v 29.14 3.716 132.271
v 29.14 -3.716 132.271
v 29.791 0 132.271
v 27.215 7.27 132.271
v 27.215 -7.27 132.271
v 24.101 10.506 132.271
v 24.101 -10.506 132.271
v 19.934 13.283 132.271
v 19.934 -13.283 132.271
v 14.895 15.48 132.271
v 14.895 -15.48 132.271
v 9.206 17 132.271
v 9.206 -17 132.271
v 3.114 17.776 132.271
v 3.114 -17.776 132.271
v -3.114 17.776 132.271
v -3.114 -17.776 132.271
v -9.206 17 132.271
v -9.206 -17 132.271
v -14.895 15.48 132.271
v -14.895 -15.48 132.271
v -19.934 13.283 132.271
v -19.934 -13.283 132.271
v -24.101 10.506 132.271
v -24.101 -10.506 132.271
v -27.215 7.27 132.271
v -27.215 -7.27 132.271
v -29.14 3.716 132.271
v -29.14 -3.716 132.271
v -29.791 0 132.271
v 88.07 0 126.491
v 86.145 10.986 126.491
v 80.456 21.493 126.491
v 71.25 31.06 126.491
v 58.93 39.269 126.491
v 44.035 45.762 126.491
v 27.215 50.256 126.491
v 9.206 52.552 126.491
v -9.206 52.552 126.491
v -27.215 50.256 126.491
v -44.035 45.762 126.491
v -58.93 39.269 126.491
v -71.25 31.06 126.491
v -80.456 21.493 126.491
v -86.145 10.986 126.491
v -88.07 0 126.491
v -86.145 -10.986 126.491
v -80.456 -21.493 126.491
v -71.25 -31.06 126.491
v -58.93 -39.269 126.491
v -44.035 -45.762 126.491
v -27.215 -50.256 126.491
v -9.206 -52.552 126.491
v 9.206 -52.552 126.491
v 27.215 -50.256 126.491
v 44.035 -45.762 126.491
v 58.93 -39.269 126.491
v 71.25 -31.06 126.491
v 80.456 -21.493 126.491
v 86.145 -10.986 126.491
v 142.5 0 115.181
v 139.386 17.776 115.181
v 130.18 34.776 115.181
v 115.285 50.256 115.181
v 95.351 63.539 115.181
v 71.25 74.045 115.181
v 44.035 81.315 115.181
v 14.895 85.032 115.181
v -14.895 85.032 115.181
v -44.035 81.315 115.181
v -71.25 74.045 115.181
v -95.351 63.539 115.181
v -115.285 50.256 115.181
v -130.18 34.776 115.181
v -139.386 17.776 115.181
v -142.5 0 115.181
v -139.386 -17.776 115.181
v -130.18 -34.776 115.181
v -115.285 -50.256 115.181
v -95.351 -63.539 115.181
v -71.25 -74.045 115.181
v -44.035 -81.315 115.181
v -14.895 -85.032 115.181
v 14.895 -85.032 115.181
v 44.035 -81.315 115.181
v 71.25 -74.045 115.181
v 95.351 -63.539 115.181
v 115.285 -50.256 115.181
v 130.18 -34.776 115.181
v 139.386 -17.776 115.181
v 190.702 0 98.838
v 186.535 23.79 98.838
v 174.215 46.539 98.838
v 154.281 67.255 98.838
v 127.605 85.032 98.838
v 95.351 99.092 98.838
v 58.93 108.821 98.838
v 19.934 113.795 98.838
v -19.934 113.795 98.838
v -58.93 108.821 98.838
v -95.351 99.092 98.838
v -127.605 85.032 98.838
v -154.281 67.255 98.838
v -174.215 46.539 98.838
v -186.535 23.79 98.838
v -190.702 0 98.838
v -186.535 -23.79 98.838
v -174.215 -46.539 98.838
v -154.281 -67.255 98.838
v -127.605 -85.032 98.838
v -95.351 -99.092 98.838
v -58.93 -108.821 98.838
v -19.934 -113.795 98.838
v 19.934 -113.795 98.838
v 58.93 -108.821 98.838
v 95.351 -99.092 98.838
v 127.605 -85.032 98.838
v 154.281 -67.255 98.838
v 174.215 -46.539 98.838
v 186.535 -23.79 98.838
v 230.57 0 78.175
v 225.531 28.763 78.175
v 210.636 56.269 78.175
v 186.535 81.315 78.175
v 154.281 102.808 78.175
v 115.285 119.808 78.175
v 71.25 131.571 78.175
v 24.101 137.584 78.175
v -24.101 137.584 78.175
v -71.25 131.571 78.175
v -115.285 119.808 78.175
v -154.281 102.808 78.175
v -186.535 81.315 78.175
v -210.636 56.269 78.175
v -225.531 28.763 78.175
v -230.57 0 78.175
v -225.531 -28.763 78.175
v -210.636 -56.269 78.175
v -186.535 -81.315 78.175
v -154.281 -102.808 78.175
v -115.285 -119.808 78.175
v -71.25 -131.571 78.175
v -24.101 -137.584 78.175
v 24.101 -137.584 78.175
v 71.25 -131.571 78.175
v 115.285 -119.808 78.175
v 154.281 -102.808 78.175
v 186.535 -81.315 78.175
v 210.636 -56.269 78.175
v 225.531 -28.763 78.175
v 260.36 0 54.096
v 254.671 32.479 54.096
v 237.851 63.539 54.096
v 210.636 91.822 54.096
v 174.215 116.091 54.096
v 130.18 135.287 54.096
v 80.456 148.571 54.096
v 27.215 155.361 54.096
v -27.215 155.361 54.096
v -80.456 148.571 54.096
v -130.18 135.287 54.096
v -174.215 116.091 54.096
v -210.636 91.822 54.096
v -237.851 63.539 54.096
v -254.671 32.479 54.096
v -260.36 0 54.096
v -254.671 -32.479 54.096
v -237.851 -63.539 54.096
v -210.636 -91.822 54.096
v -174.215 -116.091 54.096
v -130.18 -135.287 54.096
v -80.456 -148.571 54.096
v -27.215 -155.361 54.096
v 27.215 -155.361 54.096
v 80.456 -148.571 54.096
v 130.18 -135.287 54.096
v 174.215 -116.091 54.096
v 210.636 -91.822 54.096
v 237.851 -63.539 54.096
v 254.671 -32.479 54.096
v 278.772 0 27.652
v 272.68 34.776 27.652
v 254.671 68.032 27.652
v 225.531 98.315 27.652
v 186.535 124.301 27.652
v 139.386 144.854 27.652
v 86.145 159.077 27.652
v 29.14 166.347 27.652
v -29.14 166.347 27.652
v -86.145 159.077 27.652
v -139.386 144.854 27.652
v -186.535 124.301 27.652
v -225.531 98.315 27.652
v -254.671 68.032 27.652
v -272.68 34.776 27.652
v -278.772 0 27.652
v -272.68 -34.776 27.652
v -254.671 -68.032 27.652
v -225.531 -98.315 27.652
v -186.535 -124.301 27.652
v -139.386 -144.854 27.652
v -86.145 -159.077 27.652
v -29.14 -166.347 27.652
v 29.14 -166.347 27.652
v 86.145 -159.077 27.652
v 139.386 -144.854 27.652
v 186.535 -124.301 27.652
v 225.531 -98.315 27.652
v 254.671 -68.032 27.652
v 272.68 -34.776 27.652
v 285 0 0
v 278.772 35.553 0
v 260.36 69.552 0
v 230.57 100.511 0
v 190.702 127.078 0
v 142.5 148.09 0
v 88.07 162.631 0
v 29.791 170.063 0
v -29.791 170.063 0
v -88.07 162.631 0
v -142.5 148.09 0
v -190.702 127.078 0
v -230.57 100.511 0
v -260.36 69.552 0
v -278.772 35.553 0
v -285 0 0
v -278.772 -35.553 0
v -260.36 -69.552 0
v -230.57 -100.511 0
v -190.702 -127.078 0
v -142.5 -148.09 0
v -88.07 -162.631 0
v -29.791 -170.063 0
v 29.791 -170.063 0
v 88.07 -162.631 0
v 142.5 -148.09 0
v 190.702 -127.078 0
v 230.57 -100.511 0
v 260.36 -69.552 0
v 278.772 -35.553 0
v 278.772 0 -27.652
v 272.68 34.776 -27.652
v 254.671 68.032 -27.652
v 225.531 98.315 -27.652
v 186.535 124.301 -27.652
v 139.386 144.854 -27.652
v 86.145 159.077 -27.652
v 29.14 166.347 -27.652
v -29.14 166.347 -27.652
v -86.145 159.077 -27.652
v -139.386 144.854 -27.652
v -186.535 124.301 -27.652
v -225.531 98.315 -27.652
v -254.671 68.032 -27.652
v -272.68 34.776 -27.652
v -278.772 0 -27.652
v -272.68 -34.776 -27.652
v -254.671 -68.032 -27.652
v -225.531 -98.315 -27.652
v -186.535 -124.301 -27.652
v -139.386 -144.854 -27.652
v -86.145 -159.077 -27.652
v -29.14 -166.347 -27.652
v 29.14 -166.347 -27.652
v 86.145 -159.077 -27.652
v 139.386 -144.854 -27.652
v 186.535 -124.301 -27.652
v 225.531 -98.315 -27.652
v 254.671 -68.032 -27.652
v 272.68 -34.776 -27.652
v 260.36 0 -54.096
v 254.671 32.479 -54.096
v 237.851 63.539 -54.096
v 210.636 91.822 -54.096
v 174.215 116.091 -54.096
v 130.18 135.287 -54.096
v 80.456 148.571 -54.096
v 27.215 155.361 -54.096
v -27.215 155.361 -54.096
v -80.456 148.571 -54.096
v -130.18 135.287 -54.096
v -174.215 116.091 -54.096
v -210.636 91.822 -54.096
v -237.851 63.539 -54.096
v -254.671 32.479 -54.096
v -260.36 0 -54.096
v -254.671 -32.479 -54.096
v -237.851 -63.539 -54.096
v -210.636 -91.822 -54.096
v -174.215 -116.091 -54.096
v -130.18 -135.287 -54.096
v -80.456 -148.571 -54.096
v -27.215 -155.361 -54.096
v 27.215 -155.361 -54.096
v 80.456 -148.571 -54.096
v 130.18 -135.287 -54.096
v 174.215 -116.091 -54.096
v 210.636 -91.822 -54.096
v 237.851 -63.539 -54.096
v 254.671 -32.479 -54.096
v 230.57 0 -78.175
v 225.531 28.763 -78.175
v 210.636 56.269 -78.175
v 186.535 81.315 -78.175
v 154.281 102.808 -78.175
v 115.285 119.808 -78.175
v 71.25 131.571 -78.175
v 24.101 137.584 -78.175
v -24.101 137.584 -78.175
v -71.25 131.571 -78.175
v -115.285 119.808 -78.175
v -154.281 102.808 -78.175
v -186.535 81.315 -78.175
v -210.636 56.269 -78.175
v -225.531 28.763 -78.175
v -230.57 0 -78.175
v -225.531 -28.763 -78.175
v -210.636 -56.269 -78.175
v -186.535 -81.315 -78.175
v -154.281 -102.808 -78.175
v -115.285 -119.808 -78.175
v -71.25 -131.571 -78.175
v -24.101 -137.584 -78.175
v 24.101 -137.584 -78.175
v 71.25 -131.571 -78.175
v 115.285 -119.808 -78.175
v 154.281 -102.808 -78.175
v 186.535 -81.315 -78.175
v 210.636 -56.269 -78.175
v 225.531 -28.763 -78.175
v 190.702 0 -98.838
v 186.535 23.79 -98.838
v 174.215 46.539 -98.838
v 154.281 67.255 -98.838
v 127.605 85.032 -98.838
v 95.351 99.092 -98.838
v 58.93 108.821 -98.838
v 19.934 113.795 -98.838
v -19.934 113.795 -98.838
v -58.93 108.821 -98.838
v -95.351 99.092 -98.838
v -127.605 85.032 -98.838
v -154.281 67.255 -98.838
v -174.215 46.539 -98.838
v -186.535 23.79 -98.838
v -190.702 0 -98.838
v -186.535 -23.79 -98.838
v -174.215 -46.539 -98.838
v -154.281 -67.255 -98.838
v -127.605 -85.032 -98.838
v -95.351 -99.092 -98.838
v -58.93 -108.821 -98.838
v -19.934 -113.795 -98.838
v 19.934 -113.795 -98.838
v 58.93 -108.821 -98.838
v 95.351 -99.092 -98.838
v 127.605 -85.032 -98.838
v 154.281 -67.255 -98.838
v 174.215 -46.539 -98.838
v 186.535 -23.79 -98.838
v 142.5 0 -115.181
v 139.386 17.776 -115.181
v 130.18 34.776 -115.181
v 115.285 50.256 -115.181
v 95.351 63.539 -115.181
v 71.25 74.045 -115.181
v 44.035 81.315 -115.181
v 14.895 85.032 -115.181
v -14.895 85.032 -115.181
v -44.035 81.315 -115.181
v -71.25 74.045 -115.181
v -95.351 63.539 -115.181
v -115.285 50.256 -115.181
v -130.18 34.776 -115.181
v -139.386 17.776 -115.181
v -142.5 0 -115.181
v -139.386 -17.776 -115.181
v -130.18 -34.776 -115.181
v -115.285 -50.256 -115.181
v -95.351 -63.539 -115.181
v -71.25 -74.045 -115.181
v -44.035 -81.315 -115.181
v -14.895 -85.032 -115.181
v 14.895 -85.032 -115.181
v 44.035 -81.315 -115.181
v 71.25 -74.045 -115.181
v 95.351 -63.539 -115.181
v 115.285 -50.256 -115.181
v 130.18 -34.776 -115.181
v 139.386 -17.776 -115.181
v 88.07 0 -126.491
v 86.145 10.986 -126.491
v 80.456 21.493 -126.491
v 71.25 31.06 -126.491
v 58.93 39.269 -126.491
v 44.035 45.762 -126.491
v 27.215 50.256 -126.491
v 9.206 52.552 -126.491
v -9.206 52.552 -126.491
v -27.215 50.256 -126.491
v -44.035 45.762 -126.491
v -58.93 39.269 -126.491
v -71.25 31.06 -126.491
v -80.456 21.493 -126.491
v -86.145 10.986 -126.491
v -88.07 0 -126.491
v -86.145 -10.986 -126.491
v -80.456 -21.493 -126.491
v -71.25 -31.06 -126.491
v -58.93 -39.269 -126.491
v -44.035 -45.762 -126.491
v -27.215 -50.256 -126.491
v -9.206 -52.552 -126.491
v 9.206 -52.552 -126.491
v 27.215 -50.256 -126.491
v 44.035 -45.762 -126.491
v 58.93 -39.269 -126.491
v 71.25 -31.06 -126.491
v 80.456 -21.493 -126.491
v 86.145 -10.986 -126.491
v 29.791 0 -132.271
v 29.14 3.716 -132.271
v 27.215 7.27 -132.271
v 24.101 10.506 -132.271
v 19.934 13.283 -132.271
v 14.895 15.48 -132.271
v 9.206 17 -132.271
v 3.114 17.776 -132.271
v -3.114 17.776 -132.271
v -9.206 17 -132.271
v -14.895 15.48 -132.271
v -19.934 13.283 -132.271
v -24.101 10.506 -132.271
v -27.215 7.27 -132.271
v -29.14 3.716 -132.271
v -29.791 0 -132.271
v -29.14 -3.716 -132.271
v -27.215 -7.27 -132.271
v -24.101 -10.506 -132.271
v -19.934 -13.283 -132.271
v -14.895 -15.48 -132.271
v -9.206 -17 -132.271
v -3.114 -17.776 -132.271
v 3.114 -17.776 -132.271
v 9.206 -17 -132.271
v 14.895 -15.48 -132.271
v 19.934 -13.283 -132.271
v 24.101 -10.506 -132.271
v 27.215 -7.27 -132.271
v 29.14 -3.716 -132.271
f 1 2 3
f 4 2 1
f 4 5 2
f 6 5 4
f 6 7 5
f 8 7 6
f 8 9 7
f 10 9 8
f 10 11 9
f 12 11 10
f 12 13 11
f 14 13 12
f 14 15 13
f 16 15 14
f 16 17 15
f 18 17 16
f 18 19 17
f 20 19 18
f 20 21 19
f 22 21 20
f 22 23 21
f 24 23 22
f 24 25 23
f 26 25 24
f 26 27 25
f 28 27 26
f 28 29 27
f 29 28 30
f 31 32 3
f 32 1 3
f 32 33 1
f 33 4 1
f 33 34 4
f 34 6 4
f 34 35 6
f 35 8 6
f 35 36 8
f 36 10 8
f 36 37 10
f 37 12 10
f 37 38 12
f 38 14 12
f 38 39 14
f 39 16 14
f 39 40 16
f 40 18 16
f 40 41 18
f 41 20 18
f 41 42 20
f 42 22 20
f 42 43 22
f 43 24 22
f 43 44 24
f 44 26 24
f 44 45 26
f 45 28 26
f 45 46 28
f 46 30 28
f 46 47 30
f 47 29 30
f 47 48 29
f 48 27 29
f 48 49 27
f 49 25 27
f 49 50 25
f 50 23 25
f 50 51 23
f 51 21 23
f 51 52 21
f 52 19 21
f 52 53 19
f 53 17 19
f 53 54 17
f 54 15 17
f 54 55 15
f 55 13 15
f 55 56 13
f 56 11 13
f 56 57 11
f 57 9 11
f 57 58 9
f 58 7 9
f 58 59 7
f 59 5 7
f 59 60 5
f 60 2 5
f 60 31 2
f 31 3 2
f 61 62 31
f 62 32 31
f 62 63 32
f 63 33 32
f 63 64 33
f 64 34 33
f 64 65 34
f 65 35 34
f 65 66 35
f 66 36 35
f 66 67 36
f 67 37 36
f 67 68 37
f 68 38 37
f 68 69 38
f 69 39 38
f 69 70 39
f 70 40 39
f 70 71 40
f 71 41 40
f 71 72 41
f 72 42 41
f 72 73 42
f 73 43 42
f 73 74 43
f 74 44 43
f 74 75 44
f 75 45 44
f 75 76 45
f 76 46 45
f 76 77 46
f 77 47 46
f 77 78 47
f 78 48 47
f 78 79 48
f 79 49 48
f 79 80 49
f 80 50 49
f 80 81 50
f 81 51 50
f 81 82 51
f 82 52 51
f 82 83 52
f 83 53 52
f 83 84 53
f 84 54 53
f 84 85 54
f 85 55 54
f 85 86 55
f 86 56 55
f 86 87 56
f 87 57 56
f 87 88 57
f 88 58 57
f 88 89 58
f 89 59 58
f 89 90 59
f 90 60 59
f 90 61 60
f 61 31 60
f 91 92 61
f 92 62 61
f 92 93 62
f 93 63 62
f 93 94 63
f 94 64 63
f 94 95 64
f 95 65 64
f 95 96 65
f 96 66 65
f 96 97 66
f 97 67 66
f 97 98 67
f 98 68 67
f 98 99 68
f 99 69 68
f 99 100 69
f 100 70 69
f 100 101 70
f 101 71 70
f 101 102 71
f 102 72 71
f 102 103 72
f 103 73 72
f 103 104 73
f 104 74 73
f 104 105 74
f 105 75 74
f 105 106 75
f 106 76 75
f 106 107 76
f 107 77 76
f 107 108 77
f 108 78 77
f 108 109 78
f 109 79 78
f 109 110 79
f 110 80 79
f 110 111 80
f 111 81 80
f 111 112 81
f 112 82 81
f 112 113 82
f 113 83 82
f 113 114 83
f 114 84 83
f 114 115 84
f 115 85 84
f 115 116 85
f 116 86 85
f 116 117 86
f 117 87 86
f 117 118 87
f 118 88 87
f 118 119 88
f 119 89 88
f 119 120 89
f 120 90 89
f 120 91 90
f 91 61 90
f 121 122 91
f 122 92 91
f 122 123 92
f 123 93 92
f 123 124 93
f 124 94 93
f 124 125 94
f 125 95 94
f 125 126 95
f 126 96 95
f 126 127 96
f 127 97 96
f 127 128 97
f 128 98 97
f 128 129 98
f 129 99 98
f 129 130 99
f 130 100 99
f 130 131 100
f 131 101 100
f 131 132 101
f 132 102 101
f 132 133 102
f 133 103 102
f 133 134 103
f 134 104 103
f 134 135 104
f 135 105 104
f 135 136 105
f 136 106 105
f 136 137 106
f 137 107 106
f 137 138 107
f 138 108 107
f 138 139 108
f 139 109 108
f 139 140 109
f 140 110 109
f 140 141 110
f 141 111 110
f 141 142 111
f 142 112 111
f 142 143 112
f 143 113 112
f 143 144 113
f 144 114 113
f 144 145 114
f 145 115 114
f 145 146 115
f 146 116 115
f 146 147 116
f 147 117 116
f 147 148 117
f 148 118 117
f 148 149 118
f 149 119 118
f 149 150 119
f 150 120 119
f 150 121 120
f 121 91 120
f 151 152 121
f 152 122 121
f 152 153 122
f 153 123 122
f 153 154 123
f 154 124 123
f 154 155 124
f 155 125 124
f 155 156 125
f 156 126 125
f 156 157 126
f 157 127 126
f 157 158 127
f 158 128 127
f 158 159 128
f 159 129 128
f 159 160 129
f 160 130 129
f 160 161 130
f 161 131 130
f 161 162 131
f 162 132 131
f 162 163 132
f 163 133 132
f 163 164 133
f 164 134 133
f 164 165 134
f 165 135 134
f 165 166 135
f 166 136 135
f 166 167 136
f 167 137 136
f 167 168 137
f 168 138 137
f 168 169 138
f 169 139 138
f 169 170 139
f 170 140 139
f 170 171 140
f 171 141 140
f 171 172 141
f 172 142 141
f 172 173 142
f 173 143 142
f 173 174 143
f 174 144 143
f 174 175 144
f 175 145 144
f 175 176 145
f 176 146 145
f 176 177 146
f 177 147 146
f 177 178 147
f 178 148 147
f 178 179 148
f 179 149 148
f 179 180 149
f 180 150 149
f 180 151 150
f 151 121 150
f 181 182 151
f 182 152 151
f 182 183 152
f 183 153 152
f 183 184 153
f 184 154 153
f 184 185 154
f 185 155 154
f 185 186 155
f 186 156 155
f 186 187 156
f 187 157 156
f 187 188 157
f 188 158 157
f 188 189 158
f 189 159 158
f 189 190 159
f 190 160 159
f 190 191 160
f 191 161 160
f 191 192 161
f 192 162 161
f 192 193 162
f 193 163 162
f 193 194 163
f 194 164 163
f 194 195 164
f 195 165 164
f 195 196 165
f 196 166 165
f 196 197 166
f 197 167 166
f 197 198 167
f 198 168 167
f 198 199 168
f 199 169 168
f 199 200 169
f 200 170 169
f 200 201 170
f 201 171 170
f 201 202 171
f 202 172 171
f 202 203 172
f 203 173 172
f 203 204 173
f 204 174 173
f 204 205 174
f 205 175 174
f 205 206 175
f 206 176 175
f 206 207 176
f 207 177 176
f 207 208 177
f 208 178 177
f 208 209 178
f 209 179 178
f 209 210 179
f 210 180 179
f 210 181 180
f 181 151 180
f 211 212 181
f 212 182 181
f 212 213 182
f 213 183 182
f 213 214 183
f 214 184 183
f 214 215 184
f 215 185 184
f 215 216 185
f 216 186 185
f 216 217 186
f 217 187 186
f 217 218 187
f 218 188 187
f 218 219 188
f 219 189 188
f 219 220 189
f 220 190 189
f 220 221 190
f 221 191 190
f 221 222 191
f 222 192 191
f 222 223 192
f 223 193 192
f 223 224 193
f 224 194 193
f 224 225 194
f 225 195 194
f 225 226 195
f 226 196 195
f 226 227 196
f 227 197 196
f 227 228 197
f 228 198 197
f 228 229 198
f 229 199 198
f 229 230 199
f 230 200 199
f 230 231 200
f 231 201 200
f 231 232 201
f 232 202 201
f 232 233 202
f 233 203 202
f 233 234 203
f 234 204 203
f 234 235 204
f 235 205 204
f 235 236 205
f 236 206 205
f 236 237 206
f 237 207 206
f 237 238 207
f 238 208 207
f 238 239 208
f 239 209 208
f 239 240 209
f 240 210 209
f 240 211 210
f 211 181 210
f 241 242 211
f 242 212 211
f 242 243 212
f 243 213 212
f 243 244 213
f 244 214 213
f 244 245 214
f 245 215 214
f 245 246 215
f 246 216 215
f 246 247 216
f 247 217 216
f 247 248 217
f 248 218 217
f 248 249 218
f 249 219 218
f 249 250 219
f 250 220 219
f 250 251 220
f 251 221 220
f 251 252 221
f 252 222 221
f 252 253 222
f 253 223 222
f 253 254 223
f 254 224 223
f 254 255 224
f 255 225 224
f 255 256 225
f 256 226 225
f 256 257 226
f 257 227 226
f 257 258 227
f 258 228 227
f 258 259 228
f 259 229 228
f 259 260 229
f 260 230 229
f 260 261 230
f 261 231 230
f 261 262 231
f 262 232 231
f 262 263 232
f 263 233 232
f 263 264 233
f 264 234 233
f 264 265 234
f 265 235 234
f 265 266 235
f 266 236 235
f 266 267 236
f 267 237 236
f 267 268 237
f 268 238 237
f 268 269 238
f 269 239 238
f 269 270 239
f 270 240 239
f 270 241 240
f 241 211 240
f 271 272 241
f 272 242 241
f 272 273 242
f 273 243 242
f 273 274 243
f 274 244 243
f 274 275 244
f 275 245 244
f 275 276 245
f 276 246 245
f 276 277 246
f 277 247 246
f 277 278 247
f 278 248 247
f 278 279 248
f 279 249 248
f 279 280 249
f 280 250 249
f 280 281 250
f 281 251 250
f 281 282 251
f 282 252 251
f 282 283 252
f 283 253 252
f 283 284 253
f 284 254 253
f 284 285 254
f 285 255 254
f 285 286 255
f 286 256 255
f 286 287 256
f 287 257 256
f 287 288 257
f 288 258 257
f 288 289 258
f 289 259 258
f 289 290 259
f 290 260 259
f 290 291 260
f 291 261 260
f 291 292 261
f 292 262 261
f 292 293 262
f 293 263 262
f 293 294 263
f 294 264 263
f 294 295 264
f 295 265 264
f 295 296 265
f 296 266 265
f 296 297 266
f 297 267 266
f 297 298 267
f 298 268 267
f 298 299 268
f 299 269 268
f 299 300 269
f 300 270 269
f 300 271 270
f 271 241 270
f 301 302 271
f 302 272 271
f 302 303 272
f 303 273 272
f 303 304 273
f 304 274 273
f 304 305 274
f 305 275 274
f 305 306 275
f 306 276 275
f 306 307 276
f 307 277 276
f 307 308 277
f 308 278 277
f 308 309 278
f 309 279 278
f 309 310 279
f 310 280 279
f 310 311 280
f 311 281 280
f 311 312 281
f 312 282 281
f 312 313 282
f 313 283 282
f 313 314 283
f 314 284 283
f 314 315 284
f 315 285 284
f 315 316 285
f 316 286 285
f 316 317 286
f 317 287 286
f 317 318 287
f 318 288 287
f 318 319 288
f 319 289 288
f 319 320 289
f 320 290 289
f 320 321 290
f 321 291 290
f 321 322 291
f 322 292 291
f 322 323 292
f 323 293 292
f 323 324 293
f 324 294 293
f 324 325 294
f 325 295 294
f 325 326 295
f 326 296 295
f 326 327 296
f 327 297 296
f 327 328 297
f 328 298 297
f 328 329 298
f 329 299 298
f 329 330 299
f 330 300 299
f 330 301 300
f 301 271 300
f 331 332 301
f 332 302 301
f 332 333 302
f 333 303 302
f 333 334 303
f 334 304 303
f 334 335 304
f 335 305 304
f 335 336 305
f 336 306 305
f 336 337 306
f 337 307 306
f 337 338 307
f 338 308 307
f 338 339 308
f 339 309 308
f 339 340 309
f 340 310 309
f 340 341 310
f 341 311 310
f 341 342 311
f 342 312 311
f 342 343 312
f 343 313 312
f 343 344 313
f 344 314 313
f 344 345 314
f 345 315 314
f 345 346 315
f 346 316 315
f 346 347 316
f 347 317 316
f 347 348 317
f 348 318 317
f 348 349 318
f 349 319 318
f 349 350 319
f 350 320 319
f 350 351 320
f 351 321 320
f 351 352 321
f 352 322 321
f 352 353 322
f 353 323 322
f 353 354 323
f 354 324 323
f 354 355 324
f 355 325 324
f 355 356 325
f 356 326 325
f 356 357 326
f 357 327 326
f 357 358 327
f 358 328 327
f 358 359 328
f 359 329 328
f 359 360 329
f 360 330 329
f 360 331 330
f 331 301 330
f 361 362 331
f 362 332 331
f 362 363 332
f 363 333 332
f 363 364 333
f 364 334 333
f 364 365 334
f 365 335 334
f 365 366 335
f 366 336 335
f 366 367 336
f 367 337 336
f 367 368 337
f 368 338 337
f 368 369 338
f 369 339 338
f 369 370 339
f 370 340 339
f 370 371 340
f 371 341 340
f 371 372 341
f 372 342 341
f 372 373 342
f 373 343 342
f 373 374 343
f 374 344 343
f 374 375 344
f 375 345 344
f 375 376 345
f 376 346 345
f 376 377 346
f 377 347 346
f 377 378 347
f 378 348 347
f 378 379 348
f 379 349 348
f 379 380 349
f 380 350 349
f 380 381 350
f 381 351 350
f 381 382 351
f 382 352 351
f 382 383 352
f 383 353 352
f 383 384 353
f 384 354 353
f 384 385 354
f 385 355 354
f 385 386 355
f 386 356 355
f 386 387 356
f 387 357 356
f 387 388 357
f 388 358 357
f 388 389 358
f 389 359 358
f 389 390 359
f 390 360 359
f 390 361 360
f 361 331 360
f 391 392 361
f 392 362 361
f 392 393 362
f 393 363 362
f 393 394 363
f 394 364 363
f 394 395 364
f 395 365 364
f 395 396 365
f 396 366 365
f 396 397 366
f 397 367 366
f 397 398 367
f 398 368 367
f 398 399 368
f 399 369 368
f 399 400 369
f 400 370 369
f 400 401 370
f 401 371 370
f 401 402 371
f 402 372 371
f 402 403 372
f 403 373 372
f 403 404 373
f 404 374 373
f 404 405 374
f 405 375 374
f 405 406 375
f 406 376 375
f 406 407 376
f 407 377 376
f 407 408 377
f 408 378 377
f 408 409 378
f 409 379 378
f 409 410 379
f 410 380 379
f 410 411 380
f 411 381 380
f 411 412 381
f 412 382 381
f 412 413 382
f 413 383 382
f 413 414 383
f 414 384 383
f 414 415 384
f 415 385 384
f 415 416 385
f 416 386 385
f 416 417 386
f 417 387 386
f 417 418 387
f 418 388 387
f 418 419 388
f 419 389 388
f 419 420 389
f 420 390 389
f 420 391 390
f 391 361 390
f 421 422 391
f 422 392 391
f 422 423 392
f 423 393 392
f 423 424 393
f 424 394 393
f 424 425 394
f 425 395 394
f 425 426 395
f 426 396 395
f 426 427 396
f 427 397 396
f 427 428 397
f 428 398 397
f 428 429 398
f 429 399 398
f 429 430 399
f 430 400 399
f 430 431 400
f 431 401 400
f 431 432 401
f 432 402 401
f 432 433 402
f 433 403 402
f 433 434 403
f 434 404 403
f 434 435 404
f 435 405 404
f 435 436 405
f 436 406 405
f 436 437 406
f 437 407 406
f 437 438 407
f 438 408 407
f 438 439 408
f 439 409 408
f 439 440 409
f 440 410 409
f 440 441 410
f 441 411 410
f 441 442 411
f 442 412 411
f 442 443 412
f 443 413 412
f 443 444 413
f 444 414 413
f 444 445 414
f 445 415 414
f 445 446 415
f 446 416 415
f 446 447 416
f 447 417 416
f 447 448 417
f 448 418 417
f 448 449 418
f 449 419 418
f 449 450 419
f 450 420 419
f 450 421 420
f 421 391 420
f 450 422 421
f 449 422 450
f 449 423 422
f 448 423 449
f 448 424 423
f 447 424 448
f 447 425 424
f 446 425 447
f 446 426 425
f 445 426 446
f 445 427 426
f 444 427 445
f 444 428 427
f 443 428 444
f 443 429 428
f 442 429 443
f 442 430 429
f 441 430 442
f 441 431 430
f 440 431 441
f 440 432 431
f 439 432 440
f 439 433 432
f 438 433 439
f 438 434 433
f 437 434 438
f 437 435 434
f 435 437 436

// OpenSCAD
// Generated by SolidPython 1.0.1 on 2020-07-29 00:46:52


scale(v = [15, 9, 7]) {
	sphere(r = 19);
}
/***********************************************
*********      SolidPython code:      **********
************************************************
 
# import packages: SolidPython
from solid import *
from solid.utils import *
from itertools import chain, combinations, permutations


class Resize:

    def __init__(self, scad_file):
        self.scad_file = scad_file
        #self.scad_file = import_scad(scad_file)
        # cone/cylinder param:
        self.r1 = 0
        self.r2 = 0
        self.h = 0
        # rectangular prism param:
        self.w = 0
        self.l = 0
        # ellipse param:
        self.r = 0

    # import OpenScad code (file name corresponds to shape)


    # classify shape + parameters
    def assign(self, param1, param2, param3):
        if self.scad_file == 'cone.scad':
            self.r1 = param1
            self.r2 = param2
            self.h = param3
        elif self.scad_file == 'cylinder.scad':
            self.r1 = param1
            self.r2 = param2
            self.h = param3
        elif self.scad_file == 'rectangularPrism.scad':
            self.h = param1
            self.l = param2
            self.w = param3
        else:
            self.r = param1
            self.h = param2

    # resize parameters
    def iterate(self):
        x = range(3, 20, 2)
        i = 1
        if self.scad_file == 'cone.scad':
            tempList = list(permutations(x, 2))
            for temp in tempList:
                param1 = temp[0]
                param2 = temp[1]
                filepath = 'produced_scad_files/' + 'cone' + str(param1) + '_' + str(param2) + '_' + '.scad'
                scad_render_to_file(cylinder(h=param1, r1=param2, r2=0), filepath)

        elif self.scad_file == 'cylinder.scad':
            tempList = list(permutations(x, 3))
            for temp in tempList:
                param1 = temp[0]
                param2 = temp[1]
                filepath = 'produced_scad_files/' + 'cylinder' + str(param1) + '_' + str(param2) + '_' + '.scad'
                scad_render_to_file(cylinder(h=param1, r1=param2, r2=param2), filepath)

        elif self.scad_file == 'rectangularPrism.scad':
            tempList = list(permutations(x, 3))
            for temp in tempList:
                param1 = temp[0]
                param2 = temp[1]
                param3 = temp[2]
                filepath = 'produced_scad_files/' + 'rectangularPrism' + str(param1) + '_' + str(param2) + '_' + str(
                    param3) + '.scad'
                scad_render_to_file(cube(size=(param1, param2, param3)), filepath)

        elif self.scad_file == 'ellipse.scad':
            tempList = list(permutations(x, 4))
            for temp in tempList:
                param1 = temp[0]
                param2 = temp[1]
                param3 = temp[2]
                param4 = temp[3]
                filepath = 'produced_scad_files/' + 'ellipse' + str(param1) + '_' + str(param2) + '_' + str(param3) + '_' + str(param4) + '.scad'
                scad_render_to_file(scale([param1, param2, param3])(sphere(r=param4)), filepath)

    def render_to_scadfile(self):
        scad_render_to_file(scad, 'example.scad') 
 
************************************************/
